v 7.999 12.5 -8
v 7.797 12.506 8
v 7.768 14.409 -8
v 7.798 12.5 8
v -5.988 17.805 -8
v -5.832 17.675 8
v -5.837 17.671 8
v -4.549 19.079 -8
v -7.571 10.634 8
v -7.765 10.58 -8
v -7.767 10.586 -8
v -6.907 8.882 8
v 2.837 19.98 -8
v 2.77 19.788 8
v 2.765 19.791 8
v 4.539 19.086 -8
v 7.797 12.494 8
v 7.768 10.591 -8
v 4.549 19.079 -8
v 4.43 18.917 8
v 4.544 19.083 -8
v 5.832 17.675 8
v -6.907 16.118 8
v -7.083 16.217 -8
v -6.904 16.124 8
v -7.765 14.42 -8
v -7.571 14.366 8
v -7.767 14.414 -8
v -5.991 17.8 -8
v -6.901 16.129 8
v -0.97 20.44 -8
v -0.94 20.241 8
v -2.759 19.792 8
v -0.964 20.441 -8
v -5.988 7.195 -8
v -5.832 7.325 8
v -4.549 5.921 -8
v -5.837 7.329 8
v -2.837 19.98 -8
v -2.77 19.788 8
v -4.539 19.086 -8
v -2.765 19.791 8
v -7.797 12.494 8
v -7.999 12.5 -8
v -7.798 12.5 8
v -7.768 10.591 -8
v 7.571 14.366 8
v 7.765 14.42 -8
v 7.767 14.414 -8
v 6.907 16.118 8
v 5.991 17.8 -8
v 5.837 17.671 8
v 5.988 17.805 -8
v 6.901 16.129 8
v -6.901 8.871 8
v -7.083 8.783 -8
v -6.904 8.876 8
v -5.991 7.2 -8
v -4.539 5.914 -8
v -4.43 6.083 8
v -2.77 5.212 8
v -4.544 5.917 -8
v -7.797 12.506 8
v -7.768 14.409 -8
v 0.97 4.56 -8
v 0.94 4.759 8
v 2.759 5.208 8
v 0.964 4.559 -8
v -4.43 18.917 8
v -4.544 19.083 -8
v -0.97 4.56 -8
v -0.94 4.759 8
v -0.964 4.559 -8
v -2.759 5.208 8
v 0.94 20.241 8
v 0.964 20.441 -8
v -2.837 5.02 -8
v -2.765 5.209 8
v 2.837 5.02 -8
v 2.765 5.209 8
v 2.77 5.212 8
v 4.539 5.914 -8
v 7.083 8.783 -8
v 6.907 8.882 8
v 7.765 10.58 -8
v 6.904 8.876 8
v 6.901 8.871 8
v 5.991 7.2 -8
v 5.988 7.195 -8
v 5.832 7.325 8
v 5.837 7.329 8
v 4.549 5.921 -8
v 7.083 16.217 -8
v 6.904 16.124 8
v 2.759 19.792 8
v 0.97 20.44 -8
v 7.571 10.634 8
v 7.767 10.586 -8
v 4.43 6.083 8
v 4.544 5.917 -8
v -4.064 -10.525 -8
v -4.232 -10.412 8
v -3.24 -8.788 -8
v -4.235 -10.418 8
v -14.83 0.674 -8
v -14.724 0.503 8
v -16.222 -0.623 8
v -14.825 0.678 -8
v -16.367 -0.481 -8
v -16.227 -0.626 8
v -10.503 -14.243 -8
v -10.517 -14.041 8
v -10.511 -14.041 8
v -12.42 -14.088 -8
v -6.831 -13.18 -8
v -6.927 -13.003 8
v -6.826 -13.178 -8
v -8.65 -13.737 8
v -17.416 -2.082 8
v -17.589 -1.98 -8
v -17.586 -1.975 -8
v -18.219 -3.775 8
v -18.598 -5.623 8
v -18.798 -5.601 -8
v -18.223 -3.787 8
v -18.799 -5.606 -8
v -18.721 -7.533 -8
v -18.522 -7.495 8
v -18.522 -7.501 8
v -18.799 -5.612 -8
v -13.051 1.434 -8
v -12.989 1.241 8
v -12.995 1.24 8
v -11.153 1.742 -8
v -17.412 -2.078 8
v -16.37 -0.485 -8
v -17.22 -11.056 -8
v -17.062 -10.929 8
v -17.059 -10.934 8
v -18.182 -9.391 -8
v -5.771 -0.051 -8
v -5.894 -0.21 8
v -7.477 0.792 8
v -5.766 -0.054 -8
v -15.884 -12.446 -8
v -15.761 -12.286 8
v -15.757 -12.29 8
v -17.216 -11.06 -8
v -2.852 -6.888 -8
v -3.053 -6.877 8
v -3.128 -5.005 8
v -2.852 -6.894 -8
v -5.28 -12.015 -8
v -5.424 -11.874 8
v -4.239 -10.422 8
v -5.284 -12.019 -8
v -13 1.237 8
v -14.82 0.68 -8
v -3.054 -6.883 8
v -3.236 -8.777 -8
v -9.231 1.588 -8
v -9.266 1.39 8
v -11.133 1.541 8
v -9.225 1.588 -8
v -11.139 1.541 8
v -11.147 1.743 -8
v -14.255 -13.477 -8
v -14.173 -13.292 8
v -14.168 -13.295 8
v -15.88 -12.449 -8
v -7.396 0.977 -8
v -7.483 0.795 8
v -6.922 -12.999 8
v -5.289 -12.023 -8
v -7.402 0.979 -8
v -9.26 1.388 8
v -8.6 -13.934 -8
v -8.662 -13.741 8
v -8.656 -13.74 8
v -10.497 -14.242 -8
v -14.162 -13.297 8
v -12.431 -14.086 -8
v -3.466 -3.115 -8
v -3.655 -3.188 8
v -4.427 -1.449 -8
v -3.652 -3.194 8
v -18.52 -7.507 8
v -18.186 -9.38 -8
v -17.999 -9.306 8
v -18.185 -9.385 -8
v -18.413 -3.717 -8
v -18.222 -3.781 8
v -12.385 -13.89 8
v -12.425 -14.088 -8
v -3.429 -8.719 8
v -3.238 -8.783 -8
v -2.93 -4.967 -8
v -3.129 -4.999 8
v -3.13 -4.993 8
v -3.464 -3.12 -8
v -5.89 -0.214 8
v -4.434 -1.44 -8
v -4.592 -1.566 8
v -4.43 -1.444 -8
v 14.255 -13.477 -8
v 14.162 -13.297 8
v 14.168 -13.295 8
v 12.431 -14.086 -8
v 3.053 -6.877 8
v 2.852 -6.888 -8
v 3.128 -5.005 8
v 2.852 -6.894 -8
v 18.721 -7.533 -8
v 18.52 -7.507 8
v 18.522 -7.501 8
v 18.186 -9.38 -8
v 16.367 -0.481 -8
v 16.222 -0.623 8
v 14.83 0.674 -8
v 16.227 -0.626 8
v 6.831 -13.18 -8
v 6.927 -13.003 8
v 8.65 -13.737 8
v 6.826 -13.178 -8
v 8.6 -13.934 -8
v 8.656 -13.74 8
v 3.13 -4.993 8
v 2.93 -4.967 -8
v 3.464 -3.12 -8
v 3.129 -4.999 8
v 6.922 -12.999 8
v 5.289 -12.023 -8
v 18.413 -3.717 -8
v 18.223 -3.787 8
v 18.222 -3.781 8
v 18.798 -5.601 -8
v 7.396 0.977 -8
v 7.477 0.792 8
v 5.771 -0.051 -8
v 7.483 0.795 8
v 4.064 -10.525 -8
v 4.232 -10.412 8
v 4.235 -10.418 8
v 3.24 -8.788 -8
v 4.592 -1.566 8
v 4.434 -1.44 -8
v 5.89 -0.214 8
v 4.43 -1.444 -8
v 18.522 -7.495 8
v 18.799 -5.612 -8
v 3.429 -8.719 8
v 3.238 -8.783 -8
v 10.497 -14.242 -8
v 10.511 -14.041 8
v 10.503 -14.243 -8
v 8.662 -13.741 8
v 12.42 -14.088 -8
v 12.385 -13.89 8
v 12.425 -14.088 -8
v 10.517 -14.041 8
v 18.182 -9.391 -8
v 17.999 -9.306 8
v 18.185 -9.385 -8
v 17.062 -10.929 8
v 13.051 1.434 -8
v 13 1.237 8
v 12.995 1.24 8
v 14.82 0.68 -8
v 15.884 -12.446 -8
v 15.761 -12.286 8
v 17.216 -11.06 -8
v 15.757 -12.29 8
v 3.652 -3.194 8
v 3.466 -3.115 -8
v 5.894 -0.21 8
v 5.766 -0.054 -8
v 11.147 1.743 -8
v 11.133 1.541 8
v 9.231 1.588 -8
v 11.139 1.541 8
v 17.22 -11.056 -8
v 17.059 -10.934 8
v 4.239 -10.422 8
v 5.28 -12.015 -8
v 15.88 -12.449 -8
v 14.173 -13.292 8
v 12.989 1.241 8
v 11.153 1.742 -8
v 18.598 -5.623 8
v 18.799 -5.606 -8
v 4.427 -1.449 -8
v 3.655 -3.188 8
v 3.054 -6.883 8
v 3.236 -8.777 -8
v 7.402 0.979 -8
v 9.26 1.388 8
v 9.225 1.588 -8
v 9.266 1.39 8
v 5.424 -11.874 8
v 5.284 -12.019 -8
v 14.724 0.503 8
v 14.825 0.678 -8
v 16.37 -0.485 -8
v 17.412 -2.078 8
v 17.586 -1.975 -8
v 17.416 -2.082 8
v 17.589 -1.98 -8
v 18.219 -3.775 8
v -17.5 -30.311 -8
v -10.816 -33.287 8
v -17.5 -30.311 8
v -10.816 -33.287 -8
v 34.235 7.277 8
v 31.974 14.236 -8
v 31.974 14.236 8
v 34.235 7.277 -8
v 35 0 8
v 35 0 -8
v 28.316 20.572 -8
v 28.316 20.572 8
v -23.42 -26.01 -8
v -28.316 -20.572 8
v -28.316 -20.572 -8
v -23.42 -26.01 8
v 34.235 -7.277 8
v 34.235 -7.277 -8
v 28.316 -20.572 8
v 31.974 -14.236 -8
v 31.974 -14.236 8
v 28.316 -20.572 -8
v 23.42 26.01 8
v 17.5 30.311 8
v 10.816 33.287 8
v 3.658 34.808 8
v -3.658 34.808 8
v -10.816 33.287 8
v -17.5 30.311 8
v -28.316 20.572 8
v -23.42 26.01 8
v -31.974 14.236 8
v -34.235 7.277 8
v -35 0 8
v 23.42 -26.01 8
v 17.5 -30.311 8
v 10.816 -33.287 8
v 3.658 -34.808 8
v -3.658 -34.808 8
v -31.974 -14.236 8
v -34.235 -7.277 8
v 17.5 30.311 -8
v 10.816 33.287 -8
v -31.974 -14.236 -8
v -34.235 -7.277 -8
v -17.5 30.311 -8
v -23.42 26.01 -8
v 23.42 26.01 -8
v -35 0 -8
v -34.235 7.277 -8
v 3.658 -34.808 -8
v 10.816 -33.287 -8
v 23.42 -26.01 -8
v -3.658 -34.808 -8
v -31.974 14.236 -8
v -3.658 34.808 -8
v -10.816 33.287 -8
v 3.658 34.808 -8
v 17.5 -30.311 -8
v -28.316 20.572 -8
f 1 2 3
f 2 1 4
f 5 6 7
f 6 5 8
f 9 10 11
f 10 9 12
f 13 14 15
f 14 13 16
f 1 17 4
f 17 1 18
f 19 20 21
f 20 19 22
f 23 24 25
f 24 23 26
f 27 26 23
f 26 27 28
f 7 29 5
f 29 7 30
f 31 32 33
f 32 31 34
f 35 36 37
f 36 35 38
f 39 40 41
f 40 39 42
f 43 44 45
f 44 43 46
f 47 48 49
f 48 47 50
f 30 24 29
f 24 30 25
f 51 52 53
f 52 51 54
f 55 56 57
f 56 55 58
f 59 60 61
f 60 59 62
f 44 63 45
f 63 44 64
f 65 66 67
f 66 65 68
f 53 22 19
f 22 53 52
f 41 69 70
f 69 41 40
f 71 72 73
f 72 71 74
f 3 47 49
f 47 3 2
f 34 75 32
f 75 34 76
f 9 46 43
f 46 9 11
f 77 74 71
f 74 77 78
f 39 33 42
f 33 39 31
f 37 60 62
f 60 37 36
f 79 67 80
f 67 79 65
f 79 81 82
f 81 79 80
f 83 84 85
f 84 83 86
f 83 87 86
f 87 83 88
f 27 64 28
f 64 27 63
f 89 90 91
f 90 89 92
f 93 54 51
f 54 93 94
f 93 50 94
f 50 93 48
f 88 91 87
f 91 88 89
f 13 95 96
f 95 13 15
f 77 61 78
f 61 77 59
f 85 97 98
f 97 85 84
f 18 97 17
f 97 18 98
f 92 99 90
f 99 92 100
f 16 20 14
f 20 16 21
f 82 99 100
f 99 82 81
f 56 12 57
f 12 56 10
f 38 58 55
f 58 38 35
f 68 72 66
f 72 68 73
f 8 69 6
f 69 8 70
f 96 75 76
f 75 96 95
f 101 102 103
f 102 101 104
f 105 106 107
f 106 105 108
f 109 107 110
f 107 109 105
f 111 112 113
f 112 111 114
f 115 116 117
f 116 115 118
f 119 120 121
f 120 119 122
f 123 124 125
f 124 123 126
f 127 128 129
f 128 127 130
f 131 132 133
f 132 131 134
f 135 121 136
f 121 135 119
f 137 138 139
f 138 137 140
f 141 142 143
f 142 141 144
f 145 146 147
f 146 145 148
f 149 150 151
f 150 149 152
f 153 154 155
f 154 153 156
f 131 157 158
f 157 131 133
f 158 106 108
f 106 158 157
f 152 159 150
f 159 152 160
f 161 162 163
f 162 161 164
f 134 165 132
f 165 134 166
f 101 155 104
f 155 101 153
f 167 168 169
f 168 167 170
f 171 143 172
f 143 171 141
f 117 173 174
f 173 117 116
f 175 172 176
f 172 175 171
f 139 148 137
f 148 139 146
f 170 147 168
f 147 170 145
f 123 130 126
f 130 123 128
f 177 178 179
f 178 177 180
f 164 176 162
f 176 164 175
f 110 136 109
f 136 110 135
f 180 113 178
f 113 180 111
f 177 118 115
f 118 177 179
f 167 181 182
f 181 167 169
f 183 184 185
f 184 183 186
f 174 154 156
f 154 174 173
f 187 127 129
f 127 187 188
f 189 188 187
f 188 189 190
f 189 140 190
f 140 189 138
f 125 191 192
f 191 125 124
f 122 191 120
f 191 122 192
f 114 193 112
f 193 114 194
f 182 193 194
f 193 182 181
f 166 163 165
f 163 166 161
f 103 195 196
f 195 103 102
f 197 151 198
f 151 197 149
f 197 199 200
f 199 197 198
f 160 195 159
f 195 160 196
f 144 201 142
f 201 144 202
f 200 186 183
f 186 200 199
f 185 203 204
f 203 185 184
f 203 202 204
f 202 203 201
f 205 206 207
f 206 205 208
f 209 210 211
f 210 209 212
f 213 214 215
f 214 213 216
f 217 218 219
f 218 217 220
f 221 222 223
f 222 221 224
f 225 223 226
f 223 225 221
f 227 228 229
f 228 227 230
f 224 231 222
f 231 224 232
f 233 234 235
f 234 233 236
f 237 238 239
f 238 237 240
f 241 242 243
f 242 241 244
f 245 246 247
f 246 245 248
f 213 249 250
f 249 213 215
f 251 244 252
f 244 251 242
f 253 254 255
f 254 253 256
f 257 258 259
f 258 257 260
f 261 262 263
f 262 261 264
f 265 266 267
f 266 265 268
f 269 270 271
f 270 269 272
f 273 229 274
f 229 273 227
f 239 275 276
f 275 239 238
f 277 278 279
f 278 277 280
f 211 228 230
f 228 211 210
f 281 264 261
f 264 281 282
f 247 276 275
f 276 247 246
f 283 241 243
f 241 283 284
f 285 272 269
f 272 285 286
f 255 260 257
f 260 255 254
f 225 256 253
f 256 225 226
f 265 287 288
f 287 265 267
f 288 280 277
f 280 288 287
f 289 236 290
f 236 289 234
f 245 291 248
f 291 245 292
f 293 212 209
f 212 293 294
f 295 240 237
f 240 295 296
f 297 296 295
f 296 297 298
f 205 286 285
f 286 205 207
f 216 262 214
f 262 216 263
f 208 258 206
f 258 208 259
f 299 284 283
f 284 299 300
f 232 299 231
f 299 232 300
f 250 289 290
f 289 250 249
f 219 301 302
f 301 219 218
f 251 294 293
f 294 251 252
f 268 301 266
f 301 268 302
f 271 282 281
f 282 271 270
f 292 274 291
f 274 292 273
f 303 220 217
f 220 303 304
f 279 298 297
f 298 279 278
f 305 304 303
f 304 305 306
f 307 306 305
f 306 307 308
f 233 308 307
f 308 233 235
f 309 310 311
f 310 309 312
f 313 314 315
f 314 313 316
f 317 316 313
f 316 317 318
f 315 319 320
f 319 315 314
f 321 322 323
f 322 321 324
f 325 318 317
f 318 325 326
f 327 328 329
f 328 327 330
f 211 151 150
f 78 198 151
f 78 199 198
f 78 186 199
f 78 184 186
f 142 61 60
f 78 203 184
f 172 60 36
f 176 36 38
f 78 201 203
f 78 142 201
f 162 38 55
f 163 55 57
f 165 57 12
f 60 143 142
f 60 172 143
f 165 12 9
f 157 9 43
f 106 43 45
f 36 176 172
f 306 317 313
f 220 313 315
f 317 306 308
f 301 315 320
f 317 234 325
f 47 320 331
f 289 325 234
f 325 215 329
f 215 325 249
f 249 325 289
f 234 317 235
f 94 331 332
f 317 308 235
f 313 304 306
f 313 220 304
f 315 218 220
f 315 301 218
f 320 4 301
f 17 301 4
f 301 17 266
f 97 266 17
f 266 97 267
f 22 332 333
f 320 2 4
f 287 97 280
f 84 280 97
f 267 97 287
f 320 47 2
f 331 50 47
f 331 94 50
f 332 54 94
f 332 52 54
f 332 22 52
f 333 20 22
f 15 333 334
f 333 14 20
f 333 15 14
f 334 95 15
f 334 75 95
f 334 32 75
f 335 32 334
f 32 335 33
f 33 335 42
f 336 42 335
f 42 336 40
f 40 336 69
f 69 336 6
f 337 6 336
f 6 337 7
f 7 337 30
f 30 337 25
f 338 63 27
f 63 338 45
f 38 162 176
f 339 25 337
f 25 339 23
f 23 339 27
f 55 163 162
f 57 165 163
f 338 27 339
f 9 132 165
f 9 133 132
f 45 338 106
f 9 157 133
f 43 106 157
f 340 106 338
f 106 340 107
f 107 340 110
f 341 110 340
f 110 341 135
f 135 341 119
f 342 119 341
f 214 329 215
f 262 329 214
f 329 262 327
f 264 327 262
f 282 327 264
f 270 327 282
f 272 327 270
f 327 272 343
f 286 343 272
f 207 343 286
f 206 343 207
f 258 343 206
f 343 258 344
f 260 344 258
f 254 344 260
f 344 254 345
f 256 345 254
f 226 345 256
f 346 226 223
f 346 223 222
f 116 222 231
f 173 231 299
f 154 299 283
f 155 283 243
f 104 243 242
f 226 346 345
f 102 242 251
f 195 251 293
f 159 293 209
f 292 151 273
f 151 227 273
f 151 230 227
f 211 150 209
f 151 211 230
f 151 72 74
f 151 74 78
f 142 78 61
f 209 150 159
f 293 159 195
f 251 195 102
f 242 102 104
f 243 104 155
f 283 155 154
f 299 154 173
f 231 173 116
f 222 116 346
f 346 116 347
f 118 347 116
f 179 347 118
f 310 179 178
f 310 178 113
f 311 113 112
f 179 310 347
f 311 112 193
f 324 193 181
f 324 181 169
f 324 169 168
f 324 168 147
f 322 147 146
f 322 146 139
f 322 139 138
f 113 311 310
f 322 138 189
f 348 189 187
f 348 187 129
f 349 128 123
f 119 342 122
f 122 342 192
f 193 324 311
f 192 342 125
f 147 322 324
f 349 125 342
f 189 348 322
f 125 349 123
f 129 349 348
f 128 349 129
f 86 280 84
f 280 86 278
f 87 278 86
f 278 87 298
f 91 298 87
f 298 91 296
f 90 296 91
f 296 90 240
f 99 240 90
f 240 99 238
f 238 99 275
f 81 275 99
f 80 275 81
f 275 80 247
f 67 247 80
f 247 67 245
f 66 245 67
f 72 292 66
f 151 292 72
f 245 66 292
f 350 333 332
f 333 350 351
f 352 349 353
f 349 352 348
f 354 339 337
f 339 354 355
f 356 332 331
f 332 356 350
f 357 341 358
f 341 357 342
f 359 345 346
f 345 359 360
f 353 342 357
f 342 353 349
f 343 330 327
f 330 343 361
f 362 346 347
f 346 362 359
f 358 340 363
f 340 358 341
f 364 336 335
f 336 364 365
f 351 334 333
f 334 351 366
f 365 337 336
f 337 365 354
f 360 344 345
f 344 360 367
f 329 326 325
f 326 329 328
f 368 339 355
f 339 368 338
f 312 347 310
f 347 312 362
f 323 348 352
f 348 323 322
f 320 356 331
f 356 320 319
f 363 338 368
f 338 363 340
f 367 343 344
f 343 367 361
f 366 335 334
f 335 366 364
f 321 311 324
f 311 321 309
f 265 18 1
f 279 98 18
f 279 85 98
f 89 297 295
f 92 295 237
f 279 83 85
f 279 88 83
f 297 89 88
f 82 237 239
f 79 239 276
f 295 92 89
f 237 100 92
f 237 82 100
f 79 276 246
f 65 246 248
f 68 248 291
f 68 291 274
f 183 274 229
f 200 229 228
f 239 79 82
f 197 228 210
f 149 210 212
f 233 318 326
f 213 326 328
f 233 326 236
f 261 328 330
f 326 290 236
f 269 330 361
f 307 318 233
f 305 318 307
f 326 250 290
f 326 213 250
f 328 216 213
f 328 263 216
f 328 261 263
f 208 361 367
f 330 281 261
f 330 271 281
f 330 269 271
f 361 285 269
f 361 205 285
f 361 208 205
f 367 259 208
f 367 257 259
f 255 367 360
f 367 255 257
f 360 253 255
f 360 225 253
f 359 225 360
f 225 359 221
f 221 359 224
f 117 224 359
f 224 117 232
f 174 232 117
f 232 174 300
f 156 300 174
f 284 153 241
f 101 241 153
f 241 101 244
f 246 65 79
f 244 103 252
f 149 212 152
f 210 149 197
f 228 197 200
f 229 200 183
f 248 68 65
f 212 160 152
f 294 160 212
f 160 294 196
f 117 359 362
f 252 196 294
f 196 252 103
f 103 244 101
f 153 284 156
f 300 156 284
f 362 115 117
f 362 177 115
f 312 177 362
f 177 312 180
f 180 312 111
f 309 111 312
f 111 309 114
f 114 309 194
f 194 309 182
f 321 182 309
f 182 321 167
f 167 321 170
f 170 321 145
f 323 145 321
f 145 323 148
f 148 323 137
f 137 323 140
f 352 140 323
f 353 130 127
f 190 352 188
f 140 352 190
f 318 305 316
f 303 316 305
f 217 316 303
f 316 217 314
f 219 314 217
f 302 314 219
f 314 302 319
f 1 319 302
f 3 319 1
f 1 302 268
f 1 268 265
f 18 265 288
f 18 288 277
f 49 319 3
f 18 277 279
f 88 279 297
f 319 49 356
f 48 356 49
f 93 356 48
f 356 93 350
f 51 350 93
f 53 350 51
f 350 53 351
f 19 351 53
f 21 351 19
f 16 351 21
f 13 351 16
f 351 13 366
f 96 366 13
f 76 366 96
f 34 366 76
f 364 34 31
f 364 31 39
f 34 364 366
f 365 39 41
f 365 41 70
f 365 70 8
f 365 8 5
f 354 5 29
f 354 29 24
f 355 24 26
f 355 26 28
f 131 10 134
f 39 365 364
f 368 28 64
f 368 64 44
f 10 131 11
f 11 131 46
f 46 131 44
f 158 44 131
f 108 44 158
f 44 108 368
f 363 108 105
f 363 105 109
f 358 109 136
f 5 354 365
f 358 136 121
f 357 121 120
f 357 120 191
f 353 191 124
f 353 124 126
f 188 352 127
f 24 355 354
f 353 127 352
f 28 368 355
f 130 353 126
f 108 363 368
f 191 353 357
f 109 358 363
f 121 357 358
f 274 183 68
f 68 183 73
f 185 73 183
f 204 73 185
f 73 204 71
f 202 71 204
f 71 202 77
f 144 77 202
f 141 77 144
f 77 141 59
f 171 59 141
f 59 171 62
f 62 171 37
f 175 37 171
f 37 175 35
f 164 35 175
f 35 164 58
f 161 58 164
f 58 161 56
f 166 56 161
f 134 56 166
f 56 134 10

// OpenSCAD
difference() 
{
    cylinder(16,70/2,70/2,true);
    //Holes for magnets
    for (r=[0:2])
    {
        rotate([0,0,r*120])
        {
            translate([0,12.5,0] )
            cylinder(16.1,16/2,15.594/2,true);
        }
    }
}
